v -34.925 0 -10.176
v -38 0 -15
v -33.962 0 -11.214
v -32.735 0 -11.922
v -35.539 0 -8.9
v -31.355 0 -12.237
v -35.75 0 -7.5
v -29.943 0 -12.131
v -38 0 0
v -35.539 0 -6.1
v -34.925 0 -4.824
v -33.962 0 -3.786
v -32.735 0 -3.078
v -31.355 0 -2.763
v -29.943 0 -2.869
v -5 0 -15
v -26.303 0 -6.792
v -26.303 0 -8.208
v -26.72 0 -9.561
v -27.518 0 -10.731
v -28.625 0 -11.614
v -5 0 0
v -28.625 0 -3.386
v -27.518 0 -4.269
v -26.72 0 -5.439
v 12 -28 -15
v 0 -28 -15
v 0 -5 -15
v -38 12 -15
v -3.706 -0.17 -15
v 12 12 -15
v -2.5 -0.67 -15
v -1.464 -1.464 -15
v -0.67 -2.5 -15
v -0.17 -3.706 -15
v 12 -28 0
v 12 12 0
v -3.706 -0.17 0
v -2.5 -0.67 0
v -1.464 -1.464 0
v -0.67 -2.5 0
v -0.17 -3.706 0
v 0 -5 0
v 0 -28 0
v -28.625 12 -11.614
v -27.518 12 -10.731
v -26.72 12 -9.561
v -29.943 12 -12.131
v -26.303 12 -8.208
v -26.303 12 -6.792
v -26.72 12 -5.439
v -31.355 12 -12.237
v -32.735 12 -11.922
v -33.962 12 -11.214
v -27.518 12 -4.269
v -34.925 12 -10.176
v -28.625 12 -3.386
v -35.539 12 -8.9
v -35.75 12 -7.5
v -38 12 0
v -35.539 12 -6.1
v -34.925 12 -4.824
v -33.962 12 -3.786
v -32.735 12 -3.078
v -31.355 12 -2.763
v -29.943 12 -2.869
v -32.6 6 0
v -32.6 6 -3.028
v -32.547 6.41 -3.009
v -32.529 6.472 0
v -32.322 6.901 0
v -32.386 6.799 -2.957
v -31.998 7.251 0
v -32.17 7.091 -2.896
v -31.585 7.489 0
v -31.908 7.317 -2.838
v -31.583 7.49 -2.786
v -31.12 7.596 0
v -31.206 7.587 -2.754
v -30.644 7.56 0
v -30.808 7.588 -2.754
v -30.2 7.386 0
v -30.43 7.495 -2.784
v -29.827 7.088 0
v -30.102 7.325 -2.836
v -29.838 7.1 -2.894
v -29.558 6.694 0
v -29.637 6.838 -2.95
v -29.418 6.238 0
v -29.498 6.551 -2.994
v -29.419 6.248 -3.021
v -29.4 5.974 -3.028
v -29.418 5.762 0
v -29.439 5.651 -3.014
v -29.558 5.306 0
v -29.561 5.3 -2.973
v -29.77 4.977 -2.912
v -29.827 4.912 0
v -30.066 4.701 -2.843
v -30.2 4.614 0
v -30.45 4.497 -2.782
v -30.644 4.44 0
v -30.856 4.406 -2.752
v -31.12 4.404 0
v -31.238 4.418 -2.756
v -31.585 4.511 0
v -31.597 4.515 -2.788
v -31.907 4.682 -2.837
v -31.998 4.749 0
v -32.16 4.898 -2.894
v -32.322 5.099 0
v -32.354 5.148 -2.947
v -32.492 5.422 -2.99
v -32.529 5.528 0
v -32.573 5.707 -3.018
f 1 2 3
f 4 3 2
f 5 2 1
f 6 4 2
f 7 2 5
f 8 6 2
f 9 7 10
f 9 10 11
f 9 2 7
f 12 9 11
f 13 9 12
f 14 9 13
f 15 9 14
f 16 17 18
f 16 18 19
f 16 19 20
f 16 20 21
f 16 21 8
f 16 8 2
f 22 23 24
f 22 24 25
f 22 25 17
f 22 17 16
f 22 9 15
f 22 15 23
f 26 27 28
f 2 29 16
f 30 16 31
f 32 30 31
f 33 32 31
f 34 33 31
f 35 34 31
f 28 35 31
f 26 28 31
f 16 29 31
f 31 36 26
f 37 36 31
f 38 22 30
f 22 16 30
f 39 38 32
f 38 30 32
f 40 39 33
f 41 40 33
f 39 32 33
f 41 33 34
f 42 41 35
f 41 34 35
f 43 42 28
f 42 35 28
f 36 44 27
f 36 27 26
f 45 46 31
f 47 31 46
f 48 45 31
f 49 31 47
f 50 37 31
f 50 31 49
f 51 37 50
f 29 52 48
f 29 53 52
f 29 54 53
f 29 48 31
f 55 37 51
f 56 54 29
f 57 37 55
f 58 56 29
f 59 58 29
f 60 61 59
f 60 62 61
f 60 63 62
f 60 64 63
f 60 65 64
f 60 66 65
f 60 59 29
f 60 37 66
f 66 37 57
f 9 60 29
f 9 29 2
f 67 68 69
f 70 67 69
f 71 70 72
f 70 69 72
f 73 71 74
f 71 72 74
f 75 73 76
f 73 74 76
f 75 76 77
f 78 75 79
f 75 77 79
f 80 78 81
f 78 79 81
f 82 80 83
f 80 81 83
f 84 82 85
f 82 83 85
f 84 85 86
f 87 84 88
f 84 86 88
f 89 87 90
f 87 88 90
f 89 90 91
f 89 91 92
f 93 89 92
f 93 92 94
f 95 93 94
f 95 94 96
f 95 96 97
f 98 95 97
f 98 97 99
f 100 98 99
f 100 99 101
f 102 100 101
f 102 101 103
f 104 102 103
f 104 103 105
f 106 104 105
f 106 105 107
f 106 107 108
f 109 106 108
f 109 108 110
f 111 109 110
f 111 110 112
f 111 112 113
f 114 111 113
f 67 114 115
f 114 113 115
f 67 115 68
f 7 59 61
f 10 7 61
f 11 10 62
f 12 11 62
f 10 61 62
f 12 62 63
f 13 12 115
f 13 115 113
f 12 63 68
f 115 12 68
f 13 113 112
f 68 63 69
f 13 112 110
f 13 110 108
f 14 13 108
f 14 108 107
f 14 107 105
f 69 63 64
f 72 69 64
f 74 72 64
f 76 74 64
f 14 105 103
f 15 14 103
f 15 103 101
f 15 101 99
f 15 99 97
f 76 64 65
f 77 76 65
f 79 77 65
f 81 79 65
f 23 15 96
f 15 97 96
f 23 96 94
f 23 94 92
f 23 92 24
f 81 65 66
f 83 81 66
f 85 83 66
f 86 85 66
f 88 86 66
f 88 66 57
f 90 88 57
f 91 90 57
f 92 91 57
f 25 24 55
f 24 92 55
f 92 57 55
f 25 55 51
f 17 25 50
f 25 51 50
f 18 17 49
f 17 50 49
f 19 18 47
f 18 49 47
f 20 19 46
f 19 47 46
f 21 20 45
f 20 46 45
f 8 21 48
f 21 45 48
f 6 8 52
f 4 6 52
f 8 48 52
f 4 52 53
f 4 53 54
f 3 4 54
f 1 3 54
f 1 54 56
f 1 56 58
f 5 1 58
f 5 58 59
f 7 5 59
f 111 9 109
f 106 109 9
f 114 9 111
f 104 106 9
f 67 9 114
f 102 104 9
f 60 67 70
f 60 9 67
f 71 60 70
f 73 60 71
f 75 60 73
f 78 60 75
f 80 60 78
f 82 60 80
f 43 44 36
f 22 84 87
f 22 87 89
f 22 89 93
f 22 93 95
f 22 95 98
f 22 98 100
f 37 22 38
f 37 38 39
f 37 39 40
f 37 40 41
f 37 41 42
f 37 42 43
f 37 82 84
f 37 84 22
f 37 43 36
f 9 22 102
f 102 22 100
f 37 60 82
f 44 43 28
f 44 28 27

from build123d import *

# Parameters (mm, degrees)
F1_DEPTH = 15
F3_D     = 9.5
F5_D     = 3.2
F5_DEPTH = 7.5
F5_TIP   = 0.9613769904
F6_R     = 5


with BuildPart() as f1:
    # F0 (on Top) → F1 (new body)
    with BuildSketch(Plane.XY):
        Polygon((-38, 0), (0, 0), (0, -28), (12, -28), (12, 12), (-38, 12), align=None)
    extrude(amount=-F1_DEPTH)

    # F3 (through all)
    with Locations(Plane.XZ):
        with Locations((-31, -7.5)):
            Hole(F3_D / 2)

    # F5
    with Locations(Plane.XY):
        with Locations((-31, 6)):
            Hole(F5_D / 2, depth=F5_DEPTH)
            with Locations((0, 0, -(F5_DEPTH + F5_TIP / 2))):  # 118° drill point
                Cone(0, F5_D / 2, F5_TIP, mode=Mode.SUBTRACT)

    # F6
    f6_edges = [f1.edges().sort_by_distance(p)[0] for p in [
        (0, 0, -7.5),
    ]]
    fillet(f6_edges, radius=F6_R)


solid = f1.part
